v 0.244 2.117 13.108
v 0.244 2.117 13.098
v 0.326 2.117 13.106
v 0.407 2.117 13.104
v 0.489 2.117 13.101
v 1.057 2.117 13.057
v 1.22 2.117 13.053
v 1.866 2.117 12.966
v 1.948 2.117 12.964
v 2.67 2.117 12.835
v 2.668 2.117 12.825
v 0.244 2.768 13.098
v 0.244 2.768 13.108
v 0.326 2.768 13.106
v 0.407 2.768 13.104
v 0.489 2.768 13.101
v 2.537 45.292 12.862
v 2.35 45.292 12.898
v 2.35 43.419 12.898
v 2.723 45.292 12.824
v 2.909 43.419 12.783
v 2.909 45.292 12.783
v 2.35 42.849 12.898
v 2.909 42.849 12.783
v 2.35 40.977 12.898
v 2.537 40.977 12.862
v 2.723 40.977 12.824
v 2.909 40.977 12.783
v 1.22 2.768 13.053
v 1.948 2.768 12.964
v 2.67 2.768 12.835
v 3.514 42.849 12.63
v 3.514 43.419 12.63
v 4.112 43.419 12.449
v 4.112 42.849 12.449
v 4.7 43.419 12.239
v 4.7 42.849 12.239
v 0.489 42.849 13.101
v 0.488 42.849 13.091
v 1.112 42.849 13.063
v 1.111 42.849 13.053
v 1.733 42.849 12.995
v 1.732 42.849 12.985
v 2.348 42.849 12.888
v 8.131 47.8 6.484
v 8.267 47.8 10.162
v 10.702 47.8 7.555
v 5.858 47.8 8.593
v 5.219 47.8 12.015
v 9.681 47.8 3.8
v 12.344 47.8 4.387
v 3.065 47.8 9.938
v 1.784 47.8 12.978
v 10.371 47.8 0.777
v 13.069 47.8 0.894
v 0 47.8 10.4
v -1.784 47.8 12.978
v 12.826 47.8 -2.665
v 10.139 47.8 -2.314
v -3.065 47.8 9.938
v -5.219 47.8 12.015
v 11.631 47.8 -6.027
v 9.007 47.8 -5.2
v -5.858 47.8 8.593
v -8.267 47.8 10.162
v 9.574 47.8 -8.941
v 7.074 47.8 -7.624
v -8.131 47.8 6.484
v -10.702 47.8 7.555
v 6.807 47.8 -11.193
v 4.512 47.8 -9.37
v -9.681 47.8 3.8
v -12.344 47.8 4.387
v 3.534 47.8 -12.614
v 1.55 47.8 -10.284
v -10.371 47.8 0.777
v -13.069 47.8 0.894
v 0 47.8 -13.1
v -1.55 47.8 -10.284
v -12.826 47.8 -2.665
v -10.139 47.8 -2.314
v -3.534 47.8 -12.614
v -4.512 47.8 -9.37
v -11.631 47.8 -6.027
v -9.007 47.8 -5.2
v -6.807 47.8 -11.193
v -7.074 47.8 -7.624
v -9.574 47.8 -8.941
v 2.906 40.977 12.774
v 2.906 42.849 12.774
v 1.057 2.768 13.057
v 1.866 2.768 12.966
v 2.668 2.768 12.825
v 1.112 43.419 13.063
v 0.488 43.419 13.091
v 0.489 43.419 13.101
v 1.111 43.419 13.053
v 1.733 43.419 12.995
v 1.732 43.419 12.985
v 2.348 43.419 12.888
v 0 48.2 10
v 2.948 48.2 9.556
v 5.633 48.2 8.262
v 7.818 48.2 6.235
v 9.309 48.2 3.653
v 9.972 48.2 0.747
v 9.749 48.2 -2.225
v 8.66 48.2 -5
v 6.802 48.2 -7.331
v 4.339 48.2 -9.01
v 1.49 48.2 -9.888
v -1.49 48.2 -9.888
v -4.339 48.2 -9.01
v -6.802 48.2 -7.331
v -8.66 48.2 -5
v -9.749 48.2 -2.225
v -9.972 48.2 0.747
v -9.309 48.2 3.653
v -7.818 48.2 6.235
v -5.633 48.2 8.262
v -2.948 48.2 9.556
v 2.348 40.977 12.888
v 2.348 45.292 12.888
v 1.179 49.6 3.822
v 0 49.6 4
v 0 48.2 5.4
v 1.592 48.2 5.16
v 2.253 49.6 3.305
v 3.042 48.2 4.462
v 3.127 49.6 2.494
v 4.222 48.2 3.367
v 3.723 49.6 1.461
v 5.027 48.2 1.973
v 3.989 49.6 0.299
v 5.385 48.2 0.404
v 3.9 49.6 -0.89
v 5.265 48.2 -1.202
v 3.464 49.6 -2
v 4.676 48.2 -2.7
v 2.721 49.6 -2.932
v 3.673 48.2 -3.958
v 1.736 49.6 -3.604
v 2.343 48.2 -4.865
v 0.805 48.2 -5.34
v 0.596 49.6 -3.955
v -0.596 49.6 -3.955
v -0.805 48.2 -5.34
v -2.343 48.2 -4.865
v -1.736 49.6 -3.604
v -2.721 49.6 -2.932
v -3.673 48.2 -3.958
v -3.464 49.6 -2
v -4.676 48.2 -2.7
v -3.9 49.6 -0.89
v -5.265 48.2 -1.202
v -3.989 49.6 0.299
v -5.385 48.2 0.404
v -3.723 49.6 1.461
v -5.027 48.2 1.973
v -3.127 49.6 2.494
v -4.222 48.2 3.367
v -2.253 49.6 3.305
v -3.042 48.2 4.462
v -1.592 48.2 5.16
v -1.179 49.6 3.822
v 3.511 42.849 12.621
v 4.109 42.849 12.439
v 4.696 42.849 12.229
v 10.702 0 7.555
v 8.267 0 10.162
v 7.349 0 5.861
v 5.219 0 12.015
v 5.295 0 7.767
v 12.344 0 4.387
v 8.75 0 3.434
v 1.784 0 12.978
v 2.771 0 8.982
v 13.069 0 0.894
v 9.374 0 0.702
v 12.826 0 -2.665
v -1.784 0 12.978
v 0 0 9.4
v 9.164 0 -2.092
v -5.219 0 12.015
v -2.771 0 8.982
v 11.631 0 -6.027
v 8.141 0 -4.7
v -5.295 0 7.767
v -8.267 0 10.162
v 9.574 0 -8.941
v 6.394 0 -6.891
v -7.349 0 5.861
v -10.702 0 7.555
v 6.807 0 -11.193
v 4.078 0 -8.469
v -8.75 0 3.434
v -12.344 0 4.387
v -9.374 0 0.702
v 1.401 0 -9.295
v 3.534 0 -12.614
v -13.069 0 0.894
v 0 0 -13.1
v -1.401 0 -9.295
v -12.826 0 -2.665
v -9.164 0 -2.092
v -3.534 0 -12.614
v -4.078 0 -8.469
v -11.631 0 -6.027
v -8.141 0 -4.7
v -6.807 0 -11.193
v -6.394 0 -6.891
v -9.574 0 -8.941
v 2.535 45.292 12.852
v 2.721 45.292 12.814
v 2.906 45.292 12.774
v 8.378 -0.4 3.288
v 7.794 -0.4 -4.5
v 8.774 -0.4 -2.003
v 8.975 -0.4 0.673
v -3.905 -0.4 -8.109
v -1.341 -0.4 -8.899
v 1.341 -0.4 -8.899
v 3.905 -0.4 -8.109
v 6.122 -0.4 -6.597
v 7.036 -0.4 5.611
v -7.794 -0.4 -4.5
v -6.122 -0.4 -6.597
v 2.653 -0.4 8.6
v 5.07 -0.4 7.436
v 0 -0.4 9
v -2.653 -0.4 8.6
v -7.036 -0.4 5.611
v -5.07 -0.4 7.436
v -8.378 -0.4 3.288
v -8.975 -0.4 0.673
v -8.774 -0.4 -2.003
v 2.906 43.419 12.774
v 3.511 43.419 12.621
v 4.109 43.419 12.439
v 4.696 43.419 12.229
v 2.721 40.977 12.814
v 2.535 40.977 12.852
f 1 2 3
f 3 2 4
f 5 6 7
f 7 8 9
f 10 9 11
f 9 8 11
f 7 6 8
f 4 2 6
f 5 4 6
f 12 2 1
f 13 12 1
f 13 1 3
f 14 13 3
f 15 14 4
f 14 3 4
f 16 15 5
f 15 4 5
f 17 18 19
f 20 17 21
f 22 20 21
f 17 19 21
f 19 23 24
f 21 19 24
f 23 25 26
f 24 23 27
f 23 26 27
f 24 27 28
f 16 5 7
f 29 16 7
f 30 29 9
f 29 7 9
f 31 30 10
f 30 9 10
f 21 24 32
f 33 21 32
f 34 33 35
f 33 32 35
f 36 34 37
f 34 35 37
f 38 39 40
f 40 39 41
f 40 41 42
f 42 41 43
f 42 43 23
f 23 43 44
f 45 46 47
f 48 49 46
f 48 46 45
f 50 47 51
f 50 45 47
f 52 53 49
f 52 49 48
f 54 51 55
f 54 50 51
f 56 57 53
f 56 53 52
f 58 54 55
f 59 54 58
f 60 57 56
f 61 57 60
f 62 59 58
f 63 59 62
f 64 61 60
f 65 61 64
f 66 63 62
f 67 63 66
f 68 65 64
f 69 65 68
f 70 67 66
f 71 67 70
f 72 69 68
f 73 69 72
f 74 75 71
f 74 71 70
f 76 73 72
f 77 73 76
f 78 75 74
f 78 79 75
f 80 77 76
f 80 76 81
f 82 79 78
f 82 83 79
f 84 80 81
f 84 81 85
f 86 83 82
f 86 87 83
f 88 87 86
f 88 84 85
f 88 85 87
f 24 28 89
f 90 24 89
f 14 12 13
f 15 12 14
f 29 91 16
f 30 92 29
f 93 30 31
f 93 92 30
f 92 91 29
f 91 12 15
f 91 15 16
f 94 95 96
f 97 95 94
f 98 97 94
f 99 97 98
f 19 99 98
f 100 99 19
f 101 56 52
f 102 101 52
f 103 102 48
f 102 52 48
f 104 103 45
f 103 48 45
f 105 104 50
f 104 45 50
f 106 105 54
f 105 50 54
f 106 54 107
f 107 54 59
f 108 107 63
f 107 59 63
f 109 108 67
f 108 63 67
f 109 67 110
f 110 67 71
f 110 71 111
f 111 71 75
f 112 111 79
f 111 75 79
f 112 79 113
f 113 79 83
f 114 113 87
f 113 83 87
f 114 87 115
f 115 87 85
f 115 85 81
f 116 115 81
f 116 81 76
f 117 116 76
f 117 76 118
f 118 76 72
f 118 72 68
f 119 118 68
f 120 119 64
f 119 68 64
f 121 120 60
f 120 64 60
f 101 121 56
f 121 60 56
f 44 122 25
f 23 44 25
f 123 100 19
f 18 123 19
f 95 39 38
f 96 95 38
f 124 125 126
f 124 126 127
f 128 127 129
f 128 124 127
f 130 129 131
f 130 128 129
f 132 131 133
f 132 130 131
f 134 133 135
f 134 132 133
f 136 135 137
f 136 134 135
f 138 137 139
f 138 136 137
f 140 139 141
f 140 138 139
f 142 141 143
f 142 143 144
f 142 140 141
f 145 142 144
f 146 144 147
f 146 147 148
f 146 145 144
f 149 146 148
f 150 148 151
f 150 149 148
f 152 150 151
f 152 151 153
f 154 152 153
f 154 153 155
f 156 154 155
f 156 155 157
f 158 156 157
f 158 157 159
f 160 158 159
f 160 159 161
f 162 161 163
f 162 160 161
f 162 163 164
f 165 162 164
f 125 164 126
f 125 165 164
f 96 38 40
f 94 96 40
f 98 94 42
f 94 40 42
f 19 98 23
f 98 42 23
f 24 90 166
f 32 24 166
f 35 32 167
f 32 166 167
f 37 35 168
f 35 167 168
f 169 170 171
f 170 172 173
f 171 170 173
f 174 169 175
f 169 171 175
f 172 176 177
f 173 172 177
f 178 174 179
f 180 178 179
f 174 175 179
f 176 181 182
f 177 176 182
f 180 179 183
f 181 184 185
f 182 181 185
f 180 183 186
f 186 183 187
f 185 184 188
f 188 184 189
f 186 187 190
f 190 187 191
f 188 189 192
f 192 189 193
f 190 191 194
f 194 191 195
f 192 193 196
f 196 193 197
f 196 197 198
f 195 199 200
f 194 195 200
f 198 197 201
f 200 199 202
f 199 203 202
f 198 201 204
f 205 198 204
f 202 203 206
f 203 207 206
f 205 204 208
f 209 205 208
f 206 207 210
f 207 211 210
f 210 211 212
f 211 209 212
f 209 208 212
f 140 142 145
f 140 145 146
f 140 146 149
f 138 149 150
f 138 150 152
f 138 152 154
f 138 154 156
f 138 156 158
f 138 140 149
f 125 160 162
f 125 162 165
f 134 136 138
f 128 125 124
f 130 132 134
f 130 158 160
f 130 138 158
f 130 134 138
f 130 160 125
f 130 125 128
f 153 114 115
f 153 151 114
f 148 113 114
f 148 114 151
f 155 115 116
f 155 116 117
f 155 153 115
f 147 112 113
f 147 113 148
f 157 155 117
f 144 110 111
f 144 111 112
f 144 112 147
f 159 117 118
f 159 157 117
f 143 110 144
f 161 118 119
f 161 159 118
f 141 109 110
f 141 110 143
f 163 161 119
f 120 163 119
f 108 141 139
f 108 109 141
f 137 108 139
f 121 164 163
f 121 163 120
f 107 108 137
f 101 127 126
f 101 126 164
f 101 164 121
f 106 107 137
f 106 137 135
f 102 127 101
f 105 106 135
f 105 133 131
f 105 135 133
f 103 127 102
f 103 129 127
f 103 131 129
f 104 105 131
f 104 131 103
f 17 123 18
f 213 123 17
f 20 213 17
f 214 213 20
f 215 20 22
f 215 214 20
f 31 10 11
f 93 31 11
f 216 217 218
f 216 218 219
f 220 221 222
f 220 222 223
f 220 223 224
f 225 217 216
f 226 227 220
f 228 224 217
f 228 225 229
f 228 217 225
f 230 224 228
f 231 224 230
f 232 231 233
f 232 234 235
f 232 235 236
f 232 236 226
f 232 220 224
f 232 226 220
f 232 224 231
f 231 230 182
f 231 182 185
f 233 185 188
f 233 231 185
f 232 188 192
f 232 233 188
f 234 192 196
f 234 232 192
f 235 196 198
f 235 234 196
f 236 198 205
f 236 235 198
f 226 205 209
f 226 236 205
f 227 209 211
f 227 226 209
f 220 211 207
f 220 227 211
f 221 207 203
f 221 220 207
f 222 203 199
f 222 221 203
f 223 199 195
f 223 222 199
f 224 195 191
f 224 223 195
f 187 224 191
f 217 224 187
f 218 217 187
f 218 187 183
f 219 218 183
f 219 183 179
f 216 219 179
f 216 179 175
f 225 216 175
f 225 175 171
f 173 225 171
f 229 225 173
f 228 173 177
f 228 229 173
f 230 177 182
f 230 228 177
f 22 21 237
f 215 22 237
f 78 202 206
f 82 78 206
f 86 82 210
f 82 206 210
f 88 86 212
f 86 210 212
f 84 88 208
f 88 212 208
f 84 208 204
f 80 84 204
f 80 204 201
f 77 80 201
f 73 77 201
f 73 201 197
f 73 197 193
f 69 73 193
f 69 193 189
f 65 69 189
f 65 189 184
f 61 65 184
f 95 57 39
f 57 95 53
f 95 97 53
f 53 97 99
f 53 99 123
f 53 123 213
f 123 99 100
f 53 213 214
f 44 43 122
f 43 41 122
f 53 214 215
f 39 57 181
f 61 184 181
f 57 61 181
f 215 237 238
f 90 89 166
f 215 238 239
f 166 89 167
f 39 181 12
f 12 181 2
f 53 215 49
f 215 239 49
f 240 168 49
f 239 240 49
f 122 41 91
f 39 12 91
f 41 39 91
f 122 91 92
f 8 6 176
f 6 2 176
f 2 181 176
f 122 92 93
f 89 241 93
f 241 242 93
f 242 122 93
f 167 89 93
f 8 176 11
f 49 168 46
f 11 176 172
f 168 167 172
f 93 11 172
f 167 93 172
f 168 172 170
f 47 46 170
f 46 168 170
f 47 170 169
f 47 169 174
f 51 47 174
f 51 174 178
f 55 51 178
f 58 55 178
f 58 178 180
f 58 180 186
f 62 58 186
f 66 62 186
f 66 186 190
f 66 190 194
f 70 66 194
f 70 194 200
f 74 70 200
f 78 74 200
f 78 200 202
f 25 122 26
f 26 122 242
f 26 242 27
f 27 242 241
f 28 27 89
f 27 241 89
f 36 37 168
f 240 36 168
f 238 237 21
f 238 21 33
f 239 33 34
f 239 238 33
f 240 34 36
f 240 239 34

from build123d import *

# Parameters (mm, degrees)
SKETCH1_R           = 13.1
BOSS_EXTRUDE1_DEPTH = 47.8
SKETCH2_R           = 10
BOSS_EXTRUDE2_DEPTH = 0.4
SKETCH3_R           = 4
BOSS_EXTRUDE3_DEPTH = 1.4
CHAMFER2_SIZE       = 1.4
CHAMFER3_SIZE       = 0.4
SKETCH4_R           = 9
BOSS_EXTRUDE4_DEPTH = 0.4
CHAMFER4_SIZE       = 0.4
WRAP1_START         = 40.976923077
WRAP1_DEPTH         = 4.31474359
WRAP1_START_2       = 42.849358974
WRAP1_2_DEPTH       = 0.569871795
WRAP1_START_3       = 2.116666667
WRAP1_3_DEPTH       = 0.651282051


# Read off the part's stored shape, not the designer's step: Wrap1
with BuildPart() as part:
    # Sketch1 → Boss-Extrude1 (new body)
    with BuildSketch(Plane(origin=(0, 0, 0), x_dir=(1, 0, 0), z_dir=(0, 1, 0))):
        with Locations(Location((0, 0, 0), (0, 0, 90))):
            Circle(SKETCH1_R)
    extrude(amount=BOSS_EXTRUDE1_DEPTH)

    # Sketch2 → Boss-Extrude2 (add)
    with BuildSketch(Plane(origin=(0, 47.8, 0), x_dir=(1, 0, 0), z_dir=(0, 1, 0))):
        with Locations(Location((0, 0, 0), (0, 0, 270))):
            Circle(SKETCH2_R)
    extrude(amount=BOSS_EXTRUDE2_DEPTH)

    # Sketch3 → Boss-Extrude3 (add)
    with BuildSketch(Plane(origin=(0, 48.2, 0), x_dir=(1, 0, 0), z_dir=(0, 1, 0))):
        with Locations(Location((0, 0, 0), (0, 0, 270))):
            Circle(SKETCH3_R)
    extrude(amount=BOSS_EXTRUDE3_DEPTH)

    # Chamfer2
    chamfer2_edges = [part.edges().sort_by_distance(p)[0] for p in [
        (0, 48.2, -4),
    ]]
    chamfer(chamfer2_edges, length=CHAMFER2_SIZE - 0.0001)  # a hair under: the kernel refuses the full size

    # Chamfer3
    chamfer3_edges = [part.edges().sort_by_distance(p)[0] for p in [
        (0, 47.8, -10),
    ]]
    chamfer(chamfer3_edges, length=CHAMFER3_SIZE - 0.0001)  # a hair under: the kernel refuses the full size

    # Sketch4 → Boss-Extrude4 (add)
    with BuildSketch(Plane.XZ):
        with Locations(Location((0, 0, 0), (0, 0, 90))):
            Circle(SKETCH4_R)
    extrude(amount=BOSS_EXTRUDE4_DEPTH)

    # Chamfer4
    chamfer4_edges = [part.edges().sort_by_distance(p)[0] for p in [
        (0, 0, -9),
    ]]
    chamfer(chamfer4_edges, length=CHAMFER4_SIZE - 0.0001)  # a hair under: the kernel refuses the full size

    # Wrap1 outline → Wrap1 (add)
    with BuildSketch(Plane(origin=(0, 0, 0), x_dir=(1, 0, 0), z_dir=(0, 1, 0)).offset(WRAP1_START)):
        with BuildLine():
            Line((2.348137979, -12.887833333), (2.34993045, -12.897671375))
            ThreePointArc((2.34993045, -12.897671375), (2.62988756, -12.843511647), (2.908600522, -12.783275911))
            Line((2.908600522, -12.783275911), (2.906381909, -12.773525128))
            ThreePointArc((2.906381909, -12.773525128), (2.627881543, -12.833714918), (2.348137979, -12.887833333))
        make_face()
    extrude(amount=WRAP1_DEPTH)

    # Wrap1 2 outline → Wrap1 2 (add)
    with BuildSketch(Plane(origin=(0, 0, 0), x_dir=(1, 0, 0), z_dir=(0, 1, 0)).offset(WRAP1_START_2)):
        with BuildLine():
            ThreePointArc((0.488721144, -13.100887437), (1.422958155, -13.032547337), (2.34993045, -12.897671375))
            Line((2.34993045, -12.897671375), (2.348137979, -12.887833333))
            ThreePointArc((2.348137979, -12.887833333), (1.421872756, -13.022606416), (0.488348359, -13.090894388))
            Line((0.488348359, -13.090894388), (0.488721144, -13.100887437))
        make_face()
        with BuildLine():
            Line((2.906381909, -12.773525128), (2.908600522, -12.783275911))
            ThreePointArc((2.908600522, -12.783275911), (3.813980922, -12.542952186), (4.699889571, -12.238592158))
            Line((4.699889571, -12.238592158), (4.696304606, -12.229256848))
            ThreePointArc((4.696304606, -12.229256848), (3.811071706, -12.533384716), (2.906381909, -12.773525128))
        make_face()
    extrude(amount=WRAP1_2_DEPTH)

    # Wrap1 3 outline → Wrap1 3 (add)
    with BuildSketch(Plane(origin=(0, 0, 0), x_dir=(1, 0, 0), z_dir=(0, 1, 0)).offset(WRAP1_START_3)):
        with BuildLine():
            ThreePointArc((0.488721144, -13.100887437), (1.584826216, -13.01385515), (2.669782951, -12.835277909))
            Line((2.669782951, -12.835277909), (2.667746504, -12.82548746))
            ThreePointArc((2.667746504, -12.82548746), (1.462330473, -13.018125425), (0.244216621, -13.097723399))
            Line((0.244216621, -13.097723399), (0.244403046, -13.107721661))
            ThreePointArc((0.244403046, -13.107721661), (0.366578022, -13.104873923), (0.488721144, -13.100887437))
        make_face()
    extrude(amount=WRAP1_3_DEPTH)


solid = part.part
